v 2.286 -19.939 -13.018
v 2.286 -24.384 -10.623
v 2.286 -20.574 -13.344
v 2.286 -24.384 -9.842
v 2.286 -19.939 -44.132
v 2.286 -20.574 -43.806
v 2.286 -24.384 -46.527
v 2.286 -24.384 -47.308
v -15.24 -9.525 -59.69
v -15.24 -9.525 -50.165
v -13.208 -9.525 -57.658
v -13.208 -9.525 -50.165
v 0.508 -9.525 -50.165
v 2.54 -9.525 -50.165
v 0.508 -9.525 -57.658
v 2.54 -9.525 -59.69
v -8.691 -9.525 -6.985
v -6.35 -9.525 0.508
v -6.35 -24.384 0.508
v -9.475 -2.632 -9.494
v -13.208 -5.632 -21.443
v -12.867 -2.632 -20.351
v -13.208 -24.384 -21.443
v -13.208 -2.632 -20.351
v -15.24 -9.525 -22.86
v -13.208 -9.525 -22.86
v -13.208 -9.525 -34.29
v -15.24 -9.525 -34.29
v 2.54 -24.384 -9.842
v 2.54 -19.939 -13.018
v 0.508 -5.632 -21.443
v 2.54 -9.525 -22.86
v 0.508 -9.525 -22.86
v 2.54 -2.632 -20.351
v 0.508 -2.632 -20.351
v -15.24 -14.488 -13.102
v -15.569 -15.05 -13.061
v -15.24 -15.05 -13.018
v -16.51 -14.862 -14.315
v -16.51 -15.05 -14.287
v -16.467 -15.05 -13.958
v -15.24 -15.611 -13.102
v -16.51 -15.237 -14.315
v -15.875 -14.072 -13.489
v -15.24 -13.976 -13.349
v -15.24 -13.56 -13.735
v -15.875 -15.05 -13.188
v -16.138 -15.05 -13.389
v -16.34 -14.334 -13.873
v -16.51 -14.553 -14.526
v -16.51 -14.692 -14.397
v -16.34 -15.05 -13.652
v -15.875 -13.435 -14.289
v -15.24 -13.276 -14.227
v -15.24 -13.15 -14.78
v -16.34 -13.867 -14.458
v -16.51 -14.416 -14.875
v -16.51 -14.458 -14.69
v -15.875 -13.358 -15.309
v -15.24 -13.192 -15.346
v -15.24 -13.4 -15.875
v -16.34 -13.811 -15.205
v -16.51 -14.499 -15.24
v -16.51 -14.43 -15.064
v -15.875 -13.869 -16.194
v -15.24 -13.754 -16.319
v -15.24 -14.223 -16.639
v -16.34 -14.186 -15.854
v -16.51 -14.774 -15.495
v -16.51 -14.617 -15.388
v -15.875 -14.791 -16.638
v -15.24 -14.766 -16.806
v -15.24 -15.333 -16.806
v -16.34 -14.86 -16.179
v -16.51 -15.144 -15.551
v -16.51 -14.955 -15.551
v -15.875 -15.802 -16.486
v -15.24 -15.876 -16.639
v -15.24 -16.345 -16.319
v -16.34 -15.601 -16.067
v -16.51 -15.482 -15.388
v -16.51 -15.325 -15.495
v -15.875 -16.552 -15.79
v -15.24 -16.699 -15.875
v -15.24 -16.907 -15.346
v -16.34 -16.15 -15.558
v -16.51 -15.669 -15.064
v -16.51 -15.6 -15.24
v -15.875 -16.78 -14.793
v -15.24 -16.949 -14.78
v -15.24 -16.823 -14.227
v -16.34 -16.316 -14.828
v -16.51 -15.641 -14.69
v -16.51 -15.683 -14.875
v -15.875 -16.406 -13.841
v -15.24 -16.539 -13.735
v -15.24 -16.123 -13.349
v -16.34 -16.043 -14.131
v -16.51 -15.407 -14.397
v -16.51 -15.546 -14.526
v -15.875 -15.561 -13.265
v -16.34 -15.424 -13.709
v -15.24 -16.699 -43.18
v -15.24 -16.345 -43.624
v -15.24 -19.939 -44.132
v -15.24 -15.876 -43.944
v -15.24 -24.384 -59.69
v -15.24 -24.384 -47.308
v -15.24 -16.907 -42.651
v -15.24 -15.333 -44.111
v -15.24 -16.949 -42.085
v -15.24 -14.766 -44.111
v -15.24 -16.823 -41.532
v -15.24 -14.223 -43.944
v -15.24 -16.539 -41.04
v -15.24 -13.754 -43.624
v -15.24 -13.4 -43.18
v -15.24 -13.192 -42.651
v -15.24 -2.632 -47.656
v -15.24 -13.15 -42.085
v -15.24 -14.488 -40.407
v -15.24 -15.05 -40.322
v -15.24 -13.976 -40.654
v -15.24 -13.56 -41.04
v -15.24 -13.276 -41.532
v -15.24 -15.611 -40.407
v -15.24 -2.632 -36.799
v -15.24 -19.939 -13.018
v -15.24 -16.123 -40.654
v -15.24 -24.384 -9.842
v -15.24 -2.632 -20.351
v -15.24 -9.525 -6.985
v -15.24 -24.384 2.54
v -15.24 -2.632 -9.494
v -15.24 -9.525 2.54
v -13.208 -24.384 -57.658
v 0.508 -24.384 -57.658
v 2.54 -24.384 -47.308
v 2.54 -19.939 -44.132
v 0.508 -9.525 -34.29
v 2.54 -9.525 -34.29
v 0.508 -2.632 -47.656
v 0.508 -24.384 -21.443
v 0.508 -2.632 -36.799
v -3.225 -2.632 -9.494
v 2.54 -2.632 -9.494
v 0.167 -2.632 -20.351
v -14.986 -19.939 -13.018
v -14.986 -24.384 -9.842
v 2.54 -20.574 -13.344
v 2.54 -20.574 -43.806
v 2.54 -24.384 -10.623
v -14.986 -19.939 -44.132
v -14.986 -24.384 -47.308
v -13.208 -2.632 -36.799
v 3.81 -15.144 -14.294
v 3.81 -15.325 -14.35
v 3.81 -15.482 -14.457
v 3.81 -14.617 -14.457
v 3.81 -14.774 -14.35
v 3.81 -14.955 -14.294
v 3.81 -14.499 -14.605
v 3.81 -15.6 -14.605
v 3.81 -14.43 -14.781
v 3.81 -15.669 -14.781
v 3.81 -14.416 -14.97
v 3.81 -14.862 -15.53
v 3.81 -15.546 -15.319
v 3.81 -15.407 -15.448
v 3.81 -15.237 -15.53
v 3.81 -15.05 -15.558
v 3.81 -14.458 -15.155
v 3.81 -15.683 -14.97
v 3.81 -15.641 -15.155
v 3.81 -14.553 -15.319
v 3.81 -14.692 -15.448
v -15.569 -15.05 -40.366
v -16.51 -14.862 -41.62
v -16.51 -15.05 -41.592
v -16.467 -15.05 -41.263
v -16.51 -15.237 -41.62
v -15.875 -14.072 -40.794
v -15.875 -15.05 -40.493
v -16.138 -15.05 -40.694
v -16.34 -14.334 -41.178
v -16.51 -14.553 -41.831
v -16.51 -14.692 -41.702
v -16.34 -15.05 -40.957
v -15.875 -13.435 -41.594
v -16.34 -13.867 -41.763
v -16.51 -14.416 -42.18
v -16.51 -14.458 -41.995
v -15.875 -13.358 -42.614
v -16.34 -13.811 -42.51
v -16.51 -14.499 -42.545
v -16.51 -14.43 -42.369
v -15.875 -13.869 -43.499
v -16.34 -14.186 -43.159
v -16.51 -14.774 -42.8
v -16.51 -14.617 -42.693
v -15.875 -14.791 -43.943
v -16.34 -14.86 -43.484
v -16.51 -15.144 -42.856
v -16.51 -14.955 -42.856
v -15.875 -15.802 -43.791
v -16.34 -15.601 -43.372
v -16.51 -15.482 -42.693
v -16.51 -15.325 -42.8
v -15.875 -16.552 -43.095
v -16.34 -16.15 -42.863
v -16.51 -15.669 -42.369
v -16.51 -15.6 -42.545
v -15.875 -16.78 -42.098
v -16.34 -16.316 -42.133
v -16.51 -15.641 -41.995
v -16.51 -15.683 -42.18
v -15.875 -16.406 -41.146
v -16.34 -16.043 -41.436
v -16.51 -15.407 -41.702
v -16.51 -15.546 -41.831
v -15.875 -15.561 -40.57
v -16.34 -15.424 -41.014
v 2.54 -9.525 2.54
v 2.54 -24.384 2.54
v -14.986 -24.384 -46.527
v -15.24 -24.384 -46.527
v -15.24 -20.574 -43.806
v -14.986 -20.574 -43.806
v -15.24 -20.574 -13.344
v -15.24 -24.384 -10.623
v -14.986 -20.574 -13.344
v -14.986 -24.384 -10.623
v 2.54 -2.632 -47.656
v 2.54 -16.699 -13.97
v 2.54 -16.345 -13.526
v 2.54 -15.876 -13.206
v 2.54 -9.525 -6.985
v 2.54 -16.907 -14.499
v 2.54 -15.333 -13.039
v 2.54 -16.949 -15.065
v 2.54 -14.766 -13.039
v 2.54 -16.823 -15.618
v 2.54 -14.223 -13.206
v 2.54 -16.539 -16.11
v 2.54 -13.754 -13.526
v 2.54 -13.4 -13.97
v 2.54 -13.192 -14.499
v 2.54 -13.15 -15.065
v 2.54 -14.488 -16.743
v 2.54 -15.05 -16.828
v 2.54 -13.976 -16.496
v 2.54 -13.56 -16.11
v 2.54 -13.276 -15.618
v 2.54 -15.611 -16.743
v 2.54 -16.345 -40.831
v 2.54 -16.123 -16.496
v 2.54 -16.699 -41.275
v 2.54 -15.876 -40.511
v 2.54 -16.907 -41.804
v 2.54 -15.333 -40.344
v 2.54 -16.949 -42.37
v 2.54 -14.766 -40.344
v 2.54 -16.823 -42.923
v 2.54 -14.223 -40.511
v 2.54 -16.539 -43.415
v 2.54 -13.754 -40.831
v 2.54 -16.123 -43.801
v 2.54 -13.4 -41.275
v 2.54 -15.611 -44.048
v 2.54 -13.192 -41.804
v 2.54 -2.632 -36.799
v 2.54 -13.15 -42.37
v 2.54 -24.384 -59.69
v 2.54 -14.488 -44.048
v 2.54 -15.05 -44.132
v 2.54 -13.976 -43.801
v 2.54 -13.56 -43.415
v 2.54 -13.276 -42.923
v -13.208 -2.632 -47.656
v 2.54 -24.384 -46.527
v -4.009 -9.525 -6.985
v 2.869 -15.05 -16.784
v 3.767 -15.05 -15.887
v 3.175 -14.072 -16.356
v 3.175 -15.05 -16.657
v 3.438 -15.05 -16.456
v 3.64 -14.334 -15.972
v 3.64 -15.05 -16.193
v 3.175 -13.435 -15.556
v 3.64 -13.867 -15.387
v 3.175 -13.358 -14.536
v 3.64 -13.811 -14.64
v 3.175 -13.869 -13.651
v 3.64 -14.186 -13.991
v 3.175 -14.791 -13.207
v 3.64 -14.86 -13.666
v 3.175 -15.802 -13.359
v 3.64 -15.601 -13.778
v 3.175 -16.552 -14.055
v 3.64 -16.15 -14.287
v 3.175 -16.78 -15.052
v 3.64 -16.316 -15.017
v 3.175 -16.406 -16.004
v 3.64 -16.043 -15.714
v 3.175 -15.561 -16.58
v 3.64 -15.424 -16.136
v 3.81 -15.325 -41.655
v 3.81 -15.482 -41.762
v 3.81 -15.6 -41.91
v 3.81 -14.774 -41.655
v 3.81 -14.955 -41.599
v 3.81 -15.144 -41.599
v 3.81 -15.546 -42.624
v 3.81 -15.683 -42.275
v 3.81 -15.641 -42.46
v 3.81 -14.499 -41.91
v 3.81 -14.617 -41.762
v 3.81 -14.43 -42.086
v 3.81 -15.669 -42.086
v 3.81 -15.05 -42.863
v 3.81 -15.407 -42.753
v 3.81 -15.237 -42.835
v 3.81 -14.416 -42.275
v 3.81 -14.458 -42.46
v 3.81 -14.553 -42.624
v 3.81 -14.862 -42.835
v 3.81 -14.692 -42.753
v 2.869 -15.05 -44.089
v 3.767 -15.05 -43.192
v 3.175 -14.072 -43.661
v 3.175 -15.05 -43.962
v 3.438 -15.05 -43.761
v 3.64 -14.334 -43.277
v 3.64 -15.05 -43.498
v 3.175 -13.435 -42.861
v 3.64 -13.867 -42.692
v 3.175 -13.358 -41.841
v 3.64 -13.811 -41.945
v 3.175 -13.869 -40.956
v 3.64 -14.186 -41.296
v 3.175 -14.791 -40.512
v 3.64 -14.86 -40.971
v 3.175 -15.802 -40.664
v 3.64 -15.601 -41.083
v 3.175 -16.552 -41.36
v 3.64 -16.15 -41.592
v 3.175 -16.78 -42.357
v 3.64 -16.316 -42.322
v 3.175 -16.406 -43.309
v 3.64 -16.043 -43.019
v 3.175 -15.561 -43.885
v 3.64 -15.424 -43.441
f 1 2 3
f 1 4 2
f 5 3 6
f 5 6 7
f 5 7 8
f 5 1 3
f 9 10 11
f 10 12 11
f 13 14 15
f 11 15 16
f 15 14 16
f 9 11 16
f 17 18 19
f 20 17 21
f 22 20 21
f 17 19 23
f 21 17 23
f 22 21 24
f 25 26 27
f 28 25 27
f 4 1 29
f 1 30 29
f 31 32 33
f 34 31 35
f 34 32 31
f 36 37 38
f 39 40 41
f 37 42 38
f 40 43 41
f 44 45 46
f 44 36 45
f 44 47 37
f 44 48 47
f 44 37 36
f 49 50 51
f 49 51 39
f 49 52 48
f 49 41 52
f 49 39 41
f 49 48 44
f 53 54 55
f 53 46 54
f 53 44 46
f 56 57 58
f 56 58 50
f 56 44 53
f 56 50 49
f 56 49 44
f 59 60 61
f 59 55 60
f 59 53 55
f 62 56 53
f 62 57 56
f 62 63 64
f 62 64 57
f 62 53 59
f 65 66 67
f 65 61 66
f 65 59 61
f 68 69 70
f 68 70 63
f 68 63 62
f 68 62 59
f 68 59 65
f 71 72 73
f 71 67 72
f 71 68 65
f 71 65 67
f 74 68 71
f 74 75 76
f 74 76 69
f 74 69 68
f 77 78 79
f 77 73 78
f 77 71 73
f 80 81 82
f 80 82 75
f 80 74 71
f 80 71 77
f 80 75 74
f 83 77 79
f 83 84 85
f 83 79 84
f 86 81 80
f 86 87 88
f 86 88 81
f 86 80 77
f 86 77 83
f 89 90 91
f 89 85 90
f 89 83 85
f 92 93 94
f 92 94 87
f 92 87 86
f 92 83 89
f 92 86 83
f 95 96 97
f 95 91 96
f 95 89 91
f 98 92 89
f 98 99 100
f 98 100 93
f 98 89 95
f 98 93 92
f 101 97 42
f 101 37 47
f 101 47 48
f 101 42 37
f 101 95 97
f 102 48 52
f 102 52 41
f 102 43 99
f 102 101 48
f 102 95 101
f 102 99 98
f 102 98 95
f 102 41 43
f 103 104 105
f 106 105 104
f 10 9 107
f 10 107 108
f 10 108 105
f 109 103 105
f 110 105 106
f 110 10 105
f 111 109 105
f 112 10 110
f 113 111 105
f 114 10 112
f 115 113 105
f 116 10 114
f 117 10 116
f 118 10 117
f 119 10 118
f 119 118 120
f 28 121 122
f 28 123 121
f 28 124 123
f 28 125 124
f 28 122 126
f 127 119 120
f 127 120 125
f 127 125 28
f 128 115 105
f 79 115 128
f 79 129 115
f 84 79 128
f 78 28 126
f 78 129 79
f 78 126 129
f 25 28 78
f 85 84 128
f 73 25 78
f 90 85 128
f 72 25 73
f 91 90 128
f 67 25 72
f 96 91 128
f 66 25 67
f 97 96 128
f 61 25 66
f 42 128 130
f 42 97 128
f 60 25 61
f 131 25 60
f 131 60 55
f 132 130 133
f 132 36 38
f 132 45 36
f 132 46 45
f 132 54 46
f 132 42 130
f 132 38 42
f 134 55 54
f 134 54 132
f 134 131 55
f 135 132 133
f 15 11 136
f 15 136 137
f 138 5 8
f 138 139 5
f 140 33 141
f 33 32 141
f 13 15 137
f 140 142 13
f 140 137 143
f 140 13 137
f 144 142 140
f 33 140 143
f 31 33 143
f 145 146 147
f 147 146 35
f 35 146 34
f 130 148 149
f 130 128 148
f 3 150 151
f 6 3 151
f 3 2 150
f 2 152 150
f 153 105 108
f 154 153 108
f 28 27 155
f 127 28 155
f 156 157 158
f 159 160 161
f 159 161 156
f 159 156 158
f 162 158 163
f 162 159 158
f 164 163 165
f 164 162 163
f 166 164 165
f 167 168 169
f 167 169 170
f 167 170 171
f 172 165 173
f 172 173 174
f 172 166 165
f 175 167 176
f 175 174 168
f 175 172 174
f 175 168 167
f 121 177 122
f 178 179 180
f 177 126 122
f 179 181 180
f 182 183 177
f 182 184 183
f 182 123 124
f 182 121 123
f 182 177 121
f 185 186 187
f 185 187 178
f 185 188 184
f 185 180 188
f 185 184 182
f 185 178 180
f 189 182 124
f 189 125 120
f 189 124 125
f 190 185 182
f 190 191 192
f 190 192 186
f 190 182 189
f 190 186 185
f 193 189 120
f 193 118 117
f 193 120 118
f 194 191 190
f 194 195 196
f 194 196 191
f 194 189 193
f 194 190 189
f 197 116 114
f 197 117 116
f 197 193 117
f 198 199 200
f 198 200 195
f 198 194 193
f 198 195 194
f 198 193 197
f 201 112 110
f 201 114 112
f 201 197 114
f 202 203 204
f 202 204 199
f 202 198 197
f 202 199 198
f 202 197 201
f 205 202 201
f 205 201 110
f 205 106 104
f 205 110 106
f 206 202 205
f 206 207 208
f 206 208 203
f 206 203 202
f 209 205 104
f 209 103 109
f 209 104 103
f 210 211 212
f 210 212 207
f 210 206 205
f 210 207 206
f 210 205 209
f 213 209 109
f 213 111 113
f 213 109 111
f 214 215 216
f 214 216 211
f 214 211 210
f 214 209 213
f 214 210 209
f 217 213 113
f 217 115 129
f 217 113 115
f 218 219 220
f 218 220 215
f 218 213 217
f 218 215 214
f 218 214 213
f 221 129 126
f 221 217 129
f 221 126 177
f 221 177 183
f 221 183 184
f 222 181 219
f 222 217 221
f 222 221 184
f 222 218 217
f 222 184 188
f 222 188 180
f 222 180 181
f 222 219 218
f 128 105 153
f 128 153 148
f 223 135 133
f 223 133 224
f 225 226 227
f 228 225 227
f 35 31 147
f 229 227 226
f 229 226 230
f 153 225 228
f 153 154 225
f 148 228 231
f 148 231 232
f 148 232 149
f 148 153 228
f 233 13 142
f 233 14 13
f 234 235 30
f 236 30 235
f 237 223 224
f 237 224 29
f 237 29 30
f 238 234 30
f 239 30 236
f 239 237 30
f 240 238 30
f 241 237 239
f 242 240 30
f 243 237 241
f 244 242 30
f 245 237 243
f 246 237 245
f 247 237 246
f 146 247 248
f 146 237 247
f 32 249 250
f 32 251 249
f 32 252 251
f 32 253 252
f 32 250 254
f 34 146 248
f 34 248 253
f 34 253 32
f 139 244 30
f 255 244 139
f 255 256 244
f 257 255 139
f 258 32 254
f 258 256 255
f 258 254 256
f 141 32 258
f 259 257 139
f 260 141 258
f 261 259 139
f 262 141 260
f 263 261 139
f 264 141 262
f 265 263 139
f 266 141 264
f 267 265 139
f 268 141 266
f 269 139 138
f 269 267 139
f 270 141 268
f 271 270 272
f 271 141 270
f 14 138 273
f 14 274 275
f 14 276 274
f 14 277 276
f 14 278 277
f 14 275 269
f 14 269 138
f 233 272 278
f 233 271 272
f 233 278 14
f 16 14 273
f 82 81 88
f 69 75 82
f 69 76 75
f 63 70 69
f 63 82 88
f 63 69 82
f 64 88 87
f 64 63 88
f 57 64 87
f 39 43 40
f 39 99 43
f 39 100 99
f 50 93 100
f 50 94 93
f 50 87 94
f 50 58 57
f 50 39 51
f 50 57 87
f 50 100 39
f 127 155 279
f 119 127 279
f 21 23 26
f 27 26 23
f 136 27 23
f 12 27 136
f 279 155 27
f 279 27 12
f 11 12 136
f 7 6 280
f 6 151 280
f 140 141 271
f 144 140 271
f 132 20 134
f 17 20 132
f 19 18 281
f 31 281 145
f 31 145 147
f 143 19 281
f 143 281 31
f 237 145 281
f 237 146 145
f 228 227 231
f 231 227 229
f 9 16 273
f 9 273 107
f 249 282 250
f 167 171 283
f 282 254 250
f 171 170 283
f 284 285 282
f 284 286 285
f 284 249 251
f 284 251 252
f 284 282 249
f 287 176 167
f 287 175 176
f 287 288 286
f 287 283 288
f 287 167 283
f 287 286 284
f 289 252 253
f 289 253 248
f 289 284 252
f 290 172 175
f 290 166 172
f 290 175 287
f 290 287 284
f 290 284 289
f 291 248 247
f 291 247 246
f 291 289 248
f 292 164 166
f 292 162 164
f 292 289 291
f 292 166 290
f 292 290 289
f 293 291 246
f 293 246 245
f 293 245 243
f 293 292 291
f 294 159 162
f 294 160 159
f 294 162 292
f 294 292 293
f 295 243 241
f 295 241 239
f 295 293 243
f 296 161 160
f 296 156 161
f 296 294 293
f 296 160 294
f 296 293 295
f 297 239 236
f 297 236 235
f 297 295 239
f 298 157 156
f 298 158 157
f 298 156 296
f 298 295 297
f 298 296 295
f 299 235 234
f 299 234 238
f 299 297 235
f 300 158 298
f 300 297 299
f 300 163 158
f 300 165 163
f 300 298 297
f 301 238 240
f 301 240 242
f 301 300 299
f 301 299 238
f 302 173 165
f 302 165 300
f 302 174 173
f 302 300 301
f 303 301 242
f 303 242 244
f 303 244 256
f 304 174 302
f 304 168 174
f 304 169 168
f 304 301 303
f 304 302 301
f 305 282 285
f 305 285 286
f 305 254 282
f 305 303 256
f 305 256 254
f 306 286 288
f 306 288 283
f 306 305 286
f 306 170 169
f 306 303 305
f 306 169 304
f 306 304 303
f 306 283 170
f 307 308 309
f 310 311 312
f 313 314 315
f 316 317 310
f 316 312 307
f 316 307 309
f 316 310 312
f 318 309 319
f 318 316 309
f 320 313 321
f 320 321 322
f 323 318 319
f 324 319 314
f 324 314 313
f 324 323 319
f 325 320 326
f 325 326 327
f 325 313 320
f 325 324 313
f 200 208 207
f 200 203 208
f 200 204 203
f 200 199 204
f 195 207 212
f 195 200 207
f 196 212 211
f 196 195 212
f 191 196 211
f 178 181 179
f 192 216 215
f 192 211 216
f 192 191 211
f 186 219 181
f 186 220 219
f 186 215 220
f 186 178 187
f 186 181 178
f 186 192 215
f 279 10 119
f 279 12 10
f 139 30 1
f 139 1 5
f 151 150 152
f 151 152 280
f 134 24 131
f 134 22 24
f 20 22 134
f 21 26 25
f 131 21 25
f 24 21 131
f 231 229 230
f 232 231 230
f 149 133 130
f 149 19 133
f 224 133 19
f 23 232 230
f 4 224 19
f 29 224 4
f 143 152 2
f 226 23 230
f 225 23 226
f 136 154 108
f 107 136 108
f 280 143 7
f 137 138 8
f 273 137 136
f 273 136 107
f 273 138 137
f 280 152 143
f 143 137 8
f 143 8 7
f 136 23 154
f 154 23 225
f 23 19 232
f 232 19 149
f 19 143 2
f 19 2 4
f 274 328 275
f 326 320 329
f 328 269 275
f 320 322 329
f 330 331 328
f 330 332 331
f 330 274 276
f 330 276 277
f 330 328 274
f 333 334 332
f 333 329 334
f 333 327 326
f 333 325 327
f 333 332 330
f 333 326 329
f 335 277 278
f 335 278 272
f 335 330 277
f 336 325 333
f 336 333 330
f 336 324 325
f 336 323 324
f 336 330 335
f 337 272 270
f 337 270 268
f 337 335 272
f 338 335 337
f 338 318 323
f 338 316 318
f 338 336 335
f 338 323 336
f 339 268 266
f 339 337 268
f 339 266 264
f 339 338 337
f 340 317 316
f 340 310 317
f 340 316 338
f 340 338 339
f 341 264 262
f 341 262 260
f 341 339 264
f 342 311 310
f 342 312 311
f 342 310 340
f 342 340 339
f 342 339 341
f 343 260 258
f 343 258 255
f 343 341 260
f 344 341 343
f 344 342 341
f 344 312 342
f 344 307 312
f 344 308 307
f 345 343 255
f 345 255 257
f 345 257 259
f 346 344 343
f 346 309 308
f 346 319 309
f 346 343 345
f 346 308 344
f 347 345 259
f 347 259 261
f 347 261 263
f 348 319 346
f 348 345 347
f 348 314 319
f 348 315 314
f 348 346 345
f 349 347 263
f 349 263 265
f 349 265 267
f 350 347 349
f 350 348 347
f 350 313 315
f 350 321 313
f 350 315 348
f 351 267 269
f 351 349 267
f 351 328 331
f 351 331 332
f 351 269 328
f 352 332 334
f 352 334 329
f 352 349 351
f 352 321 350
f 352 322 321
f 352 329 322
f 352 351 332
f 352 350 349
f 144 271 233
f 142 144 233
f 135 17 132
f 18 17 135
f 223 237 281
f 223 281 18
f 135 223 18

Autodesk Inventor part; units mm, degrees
ref_plane "YZ Plane" through (0, 0, 0) normal (1, 0, 0) x (0, 1, 0)
ref_plane "XZ Plane" through (0, 0, 0) normal (0, 1, 0) x (-1, 0, 0)
ref_plane "XY Plane" through (0, 0, 0) normal (0, 0, 1) x (1, 0, 0)
sketch "Sketch1" plane through (0, 0, 0) normal (0, 1, 0) x (-1, 0, 0)
  line L0 (0, 0) -> (12.7, 0)
  line L1 (12.7, 0) -> (12.7, -57.15)
  line L2 (12.7, -57.15) -> (0, -57.15)
  line L3 (0, -57.15) -> (0, 0)
  line L4 (15.24, -59.69) -> (15.24, 2.54)
  line L5 (15.24, 2.54) -> (-2.54, 2.54)
  line L6 (-2.54, 2.54) -> (-2.54, -59.69)
  line L7 (-2.54, -59.69) -> (15.24, -59.69)
  dimension "d0" = 12.7
  dimension "d1" = 57.15
  dimension "d2" = 2.54
extrude "Extrusion1" add sketch "Sketch1" against normal blind 31.75
sketch "Sketch2" plane through (2.54, 0, 2.54) normal (1, 0, 0) x (0, 0, -1)
  point P0 (2.54, 0)
sketch "Sketch3" plane through (2.54, 0, 2.54) normal (1, 0, 0) x (0, 0, -1)
  line L0 (59.69, 0) -> (2.54, 0) projected
  line L1 (-1.2014, -9.525) -> (66.2927, -9.525)
  line L2 (31.115, 0) -> (31.115, -9.525)
  line L3 (0, 0) -> (0, -31.75) projected
  line L4 (0, -9.525) -> (8.255, -9.525)
  line L5 (62.23, 0) -> (62.23, -31.75) projected
  line L6 (62.23, -9.525) -> (53.975, -9.525)
  line L7 (31.115, -9.525) -> (34.925, -9.525)
  line L8 (31.115, -9.525) -> (27.305, -9.525)
  line L9 (0, -9.525) -> (9.525, -9.525)
  line L10 (31.115, -9.525) -> (25.4, -9.525)
  line L11 (31.115, -9.525) -> (36.83, -9.525)
  line L12 (62.23, -9.525) -> (52.705, -9.525)
  line L13 (0, 5.2281) -> (17.78, 5.2281)
  line L14 (17.78, 5.2281) -> (17.78, -9.525)
  line L15 (17.78, 0) -> (17.78, -2.54)
  line L16 (0, -2.54) -> (62.23, -2.54)
  line L17 (36.83, -9.525) -> (44.4179, 11.3227)
  line L18 (52.705, -9.525) -> (48.1245, 3.0598)
  line L19 (9.525, -9.525) -> (14.5428, 4.2614)
  line L20 (25.4, -9.525) -> (21.085, 2.3303)
  line L21 (36.83, -9.525) -> (52.705, -9.525)
  line L22 (-3.8276, -2.6318) -> (67.8028, -2.6318)
  line L23 (67.8028, -2.6318) -> (67.8028, 7.3948)
  line L24 (67.8028, 7.3948) -> (-3.8276, 7.3948)
  line L25 (-3.8276, 7.3948) -> (-3.8276, -2.6318)
  line L26 (-1.2014, -9.525) -> (-3.8276, -2.6318)
  line L27 (65.275, -9.525) -> (67.8028, -2.6318)
  point P0 (12.0339, -2.6318)
  point P1 (22.8911, -2.6318)
  point P2 (39.3389, -2.6318)
  point P3 (50.1961, -2.6318)
  dimension "d10" = 9.525
  dimension "d11" = 5.715
  dimension "d12" = 5.715
  dimension "d13" = 9.525
  dimension "d14" = 17.78
  dimension "d15" = 2.54
  dimension "d16" = 70
  dimension "d17" = 70
  dimension "d18" = 70
  dimension "d19" = 70
extrude "Extrusion2" cut sketch "Sketch3" against normal through all contours L18 L16 L17 L0 | L0 L17 L24 L23 L22 L5 L16 L18 | L17 L16 L2 L0 | L0 L19 L16 L3 L22 L25 L24 L17 | L18 L22 L17 L16 | L16 L5 L22 L18 | L2 L16 L20 L0 | L17 L22 L2 L16 | L22 L5 L1 L18 | L20 L16 L14 L0 | L2 L22 L20 L16 | L17 L1 L2 L22 | L22 L27 L1 L5 | L14 L16 L19 L0 | L20 L22 L14 L16 | L2 L1 L20 L22 | L22 L3 L1 L26 | L14 L22 L19 L16 | L22 L19 L1 L3 | L3 L16 L19 L22
sketch "Sketch4" plane through (2.54, -31.75, 2.54) normal (1, 0, 0) x (0, 0, -1)
  line L0 (0, 22.225) -> (0, 0) projected
  line L1 (0, 22.225) -> (0, 0)
  line L2 (0, 0) -> (0, 7.366)
  line L3 (0, 7.366) -> (62.23, 7.366)
  line L4 (62.23, 22.225) -> (62.23, 0) projected
  line L5 (12.0339, 29.1182) -> (22.8911, 29.1182) projected
  line L6 (17.4625, 29.1182) -> (17.4625, 4.5442)
  line L7 (50.1961, 29.1182) -> (39.3389, 29.1182) projected
  line L8 (44.7675, 29.1182) -> (44.7675, 5.1393)
  line L9 (17.4625, 7.366) -> (14.2875, 7.366)
  line L10 (44.7675, 7.366) -> (47.9425, 7.366)
  line L11 (47.9425, 7.366) -> (47.9425, 11.811)
  line L12 (14.2875, 7.366) -> (14.2875, 11.811)
  line L13 (17.4625, 11.811) -> (44.7675, 11.811)
  line L14 (0, 7.366) -> (0, 22.225)
  line L15 (0, 14.7955) -> (64.3687, 14.7955)
  line L16 (0, 16.7005) -> (64.3687, 16.7005)
  circle A0 centre (17.4625, 16.7005) radius 1.905
  circle A1 centre (44.7675, 16.7005) radius 1.905
  line L17 (46.6725, 11.811) -> (49.8475, 7.366)
  line L18 (15.5575, 11.811) -> (12.3825, 7.366)
  line L19 (15.5575, 11.811) -> (17.4625, 11.811)
  line L20 (46.6725, 11.811) -> (44.7675, 11.811)
  line L21 (12.8992, 6.9969) -> (15.8843, 11.176)
  line L22 (15.8843, 11.176) -> (17.4625, 11.176)
  line L23 (17.4625, 11.176) -> (44.7675, 11.176)
  line L24 (44.7675, 11.176) -> (46.3457, 11.176)
  line L25 (46.3457, 11.176) -> (49.3308, 6.9969)
  line L26 (0, 6.731) -> (62.23, 6.731)
  line L27 (12.8992, 6.9969) -> (12.7093, 6.731)
  line L28 (49.3308, 6.9969) -> (49.8475, 6.3495)
  point P0 (2.54, 31.75)
  point P1 (49.543, 6.731)
  point P2 (62.23, 6.731)
  point P3 (0, 7.366)
  point P4 (0, 6.731)
  dimension "d22" = 7.366
  dimension "d23" = 3.175
  dimension "d24" = 3.175
  dimension "d25" = 4.445
  dimension "d26" = 4.445
  dimension "d27" = 1.905
  dimension "d28" = 0.635
  dimension "d29" = 0.635
sketch "Sketch5" plane through (-15.24, -31.75, -59.69) normal (-1, 0, 0) x (0, 0, 1)
  line L0 (0, 22.225) -> (0, 0)
  line L1 (0, 22.225) -> (0, 0)
  line L2 (0, 0) -> (0, 7.366)
  line L3 (0, 7.366) -> (62.23, 7.366)
  line L4 (62.23, 22.225) -> (62.23, 0)
  line L5 (12.0339, 29.1182) -> (22.8911, 29.1182)
  line L6 (17.4625, 29.1182) -> (17.4625, 4.5442)
  line L7 (50.1961, 29.1182) -> (39.3389, 29.1182)
  line L8 (44.7675, 29.1182) -> (44.7675, 5.1393)
  line L9 (17.4625, 7.366) -> (14.2875, 7.366)
  line L10 (44.7675, 7.366) -> (47.9425, 7.366)
  line L11 (47.9425, 7.366) -> (47.9425, 11.811)
  line L12 (14.2875, 7.366) -> (14.2875, 11.811)
  line L13 (17.4625, 11.811) -> (44.7675, 11.811)
  line L14 (0, 7.366) -> (0, 22.225)
  line L15 (0, 14.7955) -> (64.3687, 14.7955)
  line L16 (0, 16.7005) -> (64.3687, 16.7005)
  circle A0 centre (17.4625, 16.7005) radius 1.905
  circle A1 centre (44.7675, 16.7005) radius 1.905
  line L17 (46.6725, 11.811) -> (49.8475, 7.366)
  line L18 (15.5575, 11.811) -> (12.3825, 7.366)
  line L19 (15.5575, 11.811) -> (17.4625, 11.811)
  line L20 (46.6725, 11.811) -> (44.7675, 11.811)
  line L21 (12.8992, 6.9969) -> (15.8843, 11.176)
  line L22 (15.8843, 11.176) -> (17.4625, 11.176)
  line L23 (17.4625, 11.176) -> (44.7675, 11.176)
  line L24 (44.7675, 11.176) -> (46.3457, 11.176)
  line L25 (46.3457, 11.176) -> (49.3308, 6.9969)
  line L26 (0, 6.731) -> (62.23, 6.731)
  line L27 (12.8992, 6.9969) -> (12.7093, 6.731)
  line L28 (49.3308, 6.9969) -> (49.8475, 6.3495)
  point P0 (59.69, 31.75)
  point P1 (2.54, 31.75)
  point P2 (0, 6.731)
  point P3 (49.543, 6.731)
  point P4 (62.23, 6.731)
  point P5 (0, 7.366)
  dimension "d30" = 7.366
  dimension "d31" = 3.175
  dimension "d32" = 3.175
  dimension "d33" = 4.445
  dimension "d34" = 4.445
  dimension "d35" = 1.905
  dimension "d36" = 0.635
  dimension "d37" = 0.635
extrude "Extrusion3" cut sketch "Sketch5" against normal blind 0.254 contours L3 L21 L27 L26 L0 | L18 L12 L21 L3 | L13 L8 L23 L6 | L6 L22 L21 L12 L18 L19 | L20 L17 L11 L25 L24 L8 | L4 L26 L28 L25 L3 | L17 L3 L25 L11
sketch "Sketch6" plane through (-15.24, -9.525, -34.29) normal (-1, 0, 0) x (0, 0, 1)
  line L0 (-25.4, 0) -> (-25.4, -22.225)
  line L1 (-25.4, 0) -> (-25.4, -22.225)
  line L2 (-25.4, -22.225) -> (-25.4, -14.859)
  line L3 (-25.4, -14.859) -> (36.83, -14.859)
  line L4 (36.83, 0) -> (36.83, -22.225)
  line L5 (-13.3661, 6.8933) -> (-2.5089, 6.8933)
  line L6 (-7.9375, 6.8933) -> (-7.9375, -17.6808)
  line L7 (24.7961, 6.8933) -> (13.9389, 6.8933)
  line L8 (19.3675, 6.8933) -> (19.3675, -17.0857)
  line L9 (-7.9375, -14.859) -> (-11.1125, -14.859)
  line L10 (19.3675, -14.859) -> (22.5425, -14.859)
  line L11 (22.5425, -14.859) -> (22.5425, -10.414)
  line L12 (-11.1125, -14.859) -> (-11.1125, -10.414)
  line L13 (-7.9375, -10.414) -> (19.3675, -10.414)
  line L14 (-25.4, -14.859) -> (-25.4, 0)
  line L15 (-25.4, -7.4295) -> (38.9686, -7.4295)
  line L16 (-25.4, -5.5245) -> (38.9686, -5.5245)
  circle A0 centre (-7.9375, -5.5245) radius 1.905
  circle A1 centre (19.3675, -5.5245) radius 1.905
  line L17 (21.2725, -10.414) -> (24.4475, -14.859)
  line L18 (-9.8425, -10.414) -> (-13.0175, -14.859)
  line L19 (-9.8425, -10.414) -> (-7.9375, -10.414)
  line L20 (21.2725, -10.414) -> (19.3675, -10.414)
  line L21 (-12.5008, -15.228) -> (-9.5157, -11.049)
  line L22 (-9.5157, -11.049) -> (-7.9375, -11.049)
  line L23 (-7.9375, -11.049) -> (19.3675, -11.049)
  line L24 (19.3675, -11.049) -> (20.9457, -11.049)
  line L25 (20.9457, -11.049) -> (23.9308, -15.228)
  line L26 (-25.4, -15.494) -> (36.83, -15.494)
  line L27 (-12.5008, -15.228) -> (-12.6907, -15.494)
  line L28 (23.9308, -15.228) -> (24.4475, -15.8755)
  point P0 (34.29, 9.525)
  point P1 (-22.86, 9.525)
  dimension "d40" = 7.366
  dimension "d41" = 3.175
  dimension "d42" = 3.175
  dimension "d43" = 4.445
  dimension "d44" = 4.445
  dimension "d45" = 1.905
  dimension "d46" = 0.635
  dimension "d47" = 0.635
extrude "Extrusion4" cut sketch "Sketch4" against normal blind 0.254 contours L3 L21 L27 L26 L0 | L18 L12 L21 L3 | L13 L8 L23 L6 | L6 L22 L21 L12 L18 L19 | L20 L17 L11 L25 L24 L8 | L4 L26 L28 L25 L3 | L17 L3 L25 L11
sketch "Sketch7" plane through (2.54, -9.525, -22.86) normal (1, 0, 0) x (0, 0, -1)
  point P0 (-22.86, 9.525)
extrude "Extrusion5" add sketch "Sketch6" along normal blind 1.27 contours A0 L6 L16 | L16 L6 A0 | L6 L16 A0 | L6 A0 L16 | A1 L16 L8 | L8 L16 A1 | L16 A1 L8 | L8 A1 L16
sketch "Sketch8" plane through (2.54, -9.525, -22.86) normal (1, 0, 0) x (0, 0, -1)
  circle A0 centre (-7.9375, -5.5245) radius 1.905 projected
  circle A1 centre (-7.9375, -5.5245) radius 1.905
  circle A2 centre (19.3675, -5.5245) radius 1.905 projected
  circle A3 centre (19.3675, -5.5245) radius 1.905
  point P0 (-22.86, 9.525)
extrude "Extrusion6" add sketch "Sketch8" along normal blind 1.27
sketch "Sketch9" plane through (-15.24, -9.525, -34.29) normal (-1, 0, 0) x (0, 0, 1)
  line L0 (-25.4, 0) -> (-25.4, -14.859) projected
  line L1 (-25.4, -15.494) -> (-12.713, -15.494) projected
  line L2 (-25.4, -14.859) -> (-25.146, -14.859)
  line L3 (-25.146, -14.859) -> (-25.146, -15.494)
  line L4 (-25.146, -15.494) -> (-25.4, -15.494)
  line L5 (-25.4, -15.494) -> (-25.4, -14.859)
  line L6 (24.4475, -14.859) -> (36.83, -14.859) projected
  line L7 (36.83, -15.494) -> (36.576, -15.494)
  line L8 (36.576, -15.494) -> (36.576, -14.859)
  line L9 (36.576, -14.859) -> (36.83, -14.859)
  line L10 (36.83, -14.859) -> (36.83, -15.494)
  point P0 (34.29, 9.525)
  dimension "d54" = 0.254
  dimension "d55" = 0.254
extrude "Extrusion7" cut sketch "Sketch9" against normal blind 2540
fillet "Fillet1" radius 1.27 4 edges at (-16.51, -15.0495, -44.1325) (-16.51, -15.0495, -16.8275) (3.81, -15.0495, -13.0175) (3.81, -15.0495, -40.3225)
sketch "Sketch10" plane through (-12.7, -31.75, 0) normal (1, 0, 0) x (0, 0, -1)
  line L0 (0, 0) -> (57.15, 0) projected
  line L1 (59.69, 6.731) -> (59.69, 0) projected
  line L2 (0, 0) -> (59.69, 0)
  line L3 (59.69, 0) -> (59.69, 2.54)
  line L4 (59.69, 2.54) -> (0, 2.54)
  line L5 (0, 2.54) -> (0, 0)
  point P0 (0, 31.75)
  dimension "d59" = 2.54
extrude "Extrusion8" add sketch "Sketch10" along normal blind 13.97
sketch "Sketch11" plane through (0, -31.75, 0) normal (0, -1, 0) x (1, 0, 0)
  line L0 (-14.986, 2.286) -> (2.286, 2.286) projected
  line L1 (-15.24, -59.69) -> (2.54, -59.69) projected
  line L2 (2.54, -59.69) -> (2.54, 2.54) projected
  line L3 (2.54, 2.54) -> (-15.24, 2.54) projected
  line L4 (-15.24, 2.54) -> (-15.24, -59.69) projected
  line L5 (2.54, 2.54) -> (-15.24, 2.54) projected
  line L6 (-15.24, 2.54) -> (-15.24, -59.69) projected
  line L7 (2.54, 2.54) -> (-15.24, 2.54)
  line L8 (-6.35, 2.54) -> (-6.35, -73.2996)
  line L9 (-6.35, 2.54) -> (-4.445, 2.54)
  line L10 (-6.35, 2.54) -> (-8.255, 2.54)
  line L11 (-14.986, -59.436) -> (2.286, -59.436) projected
  line L12 (-8.255, 2.54) -> (-4.445, 2.54)
  line L13 (-4.445, 2.54) -> (-4.445, -59.436)
  line L14 (-4.445, -59.436) -> (-8.255, -59.436)
  line L15 (-8.255, -59.436) -> (-8.255, 2.54)
  point P0 (0, 0)
  point P1 (-8.255, 2.286)
  point P2 (-4.445, 2.286)
  dimension "d62" = 1.905
  dimension "d63" = 1.905
extrude "Extrusion9" add sketch "Sketch11" along normal blind 76.2 contours L0 L8 L11 L15 | L0 L13 L11 L8
sketch "Sketch12" plane through (-4.445, -31.75, 2.286) normal (1, 0, 0) x (0, 0, -1)
  line L0 (-988.062, -700.5234) -> (-988.062, 1325.7378) construction
  line L1 (-988.062, 1325.7378) -> (444.4144, 1325.7378) construction
  line L2 (444.4144, 1325.7378) -> (444.4144, -700.5234) construction
  line L3 (444.4144, -700.5234) -> (-988.062, -700.5234) construction
  line L4 (0, 0) -> (61.722, 0) projected
  line L5 (0, 0) -> (0, -76.2) projected
  line L6 (61.722, -76.2) -> (0, -76.2) projected
  line L7 (61.722, 0) -> (61.722, -76.2) projected
  line L8 (0, 0) -> (61.722, 0) projected
  line L9 (0, 0) -> (6.35, 0)
  line L10 (6.35, 0) -> (6.35, -11.43)
  line L11 (-0.254, 0) -> (61.976, 0) projected
  line L12 (61.722, 0) -> (55.372, 0)
  line L13 (55.372, 0) -> (55.372, -11.43)
  line L14 (0, 0) -> (0, -63.5)
  line L15 (0, 0) -> (0, -76.2) projected
  line L16 (39.4357, -63.5) -> (61.722, -63.5)
  line L17 (61.722, 0) -> (61.722, -76.2) projected
  line L18 (0, -63.5) -> (10.16, -63.5)
  line L19 (61.722, -63.5) -> (51.562, -63.5)
  line L20 (10.16, -63.5) -> (22.2863, -63.5)
  line L21 (50.9718, -63.5) -> (38.862, -63.5)
  line L22 (50.5789, -63.5) -> (54.7064, -63.5)
  line L23 (54.7064, -63.5) -> (46.4514, -63.5)
  line L24 (30.861, 0) -> (30.861, -25.4)
  line L25 (6.35, -11.43) -> (10.1169, -62.9113)
  line L26 (22.918, -62.9292) -> (26.6755, -25.9708)
  line L27 (27.3072, -25.4) -> (34.4148, -25.4)
  line L28 (35.0465, -25.9708) -> (38.804, -62.9292)
  line L29 (51.6051, -62.9113) -> (55.372, -11.43)
  line L30 (6.35, 0) -> (16.51, 0)
  line L31 (55.372, 0) -> (45.212, 0)
  arc A0 (6.35, -11.43) -> (16.51, 0) centre (5.0802, -0.0708) ccw
  arc A1 (45.212, 0) -> (55.372, -11.43) centre (56.6418, -0.0708) ccw
  arc A2 (27.3072, -25.4) -> (26.6755, -25.9708) centre (27.3072, -26.035) ccw
  arc A3 (35.0465, -25.9708) -> (34.4148, -25.4) centre (34.4148, -26.035) ccw
  arc A4 (22.2863, -63.5) -> (22.918, -62.9292) centre (22.2863, -62.865) ccw
  arc A5 (10.1169, -62.9113) -> (10.7502, -63.5) centre (10.7502, -62.865) ccw
  arc A6 (38.804, -62.9292) -> (39.4357, -63.5) centre (39.4357, -62.865) ccw
  arc A7 (50.9718, -63.5) -> (51.6051, -62.9113) centre (50.9718, -62.865) ccw
  line L32 (16.51, -63.5) -> (16.51, -52.07)
  line L33 (46.4514, -63.5) -> (46.4514, -52.07)
  line L34 (30.861, -25.4) -> (30.861, -19.05)
  line L35 (30.861, -19.05) -> (15.621, -19.05)
  line L36 (30.861, -19.05) -> (46.101, -19.05)
  circle A8 centre (15.621, -19.05) radius 3.175
  circle A9 centre (46.101, -19.05) radius 3.175
  circle A10 centre (16.51, -52.07) radius 3.175
  circle A11 centre (46.4514, -52.07) radius 3.175
  point P0 (2.286, 31.75)
  point P1 (22.86, -63.5)
  point P2 (10.7502, -63.5)
  dimension "d107" = 6.35
  dimension "d110" = 11.43
  dimension "d113" = 6.35
  dimension "d114" = 11.43
  dimension "d115" = 63.5
  dimension "d116" = 10.16
  dimension "d117" = 10.16
  dimension "d118" = 12.7
  dimension "d119" = 12.7
  dimension "d120" = 4.1275
  dimension "d121" = 8.255
  dimension "d122" = 25.4
  dimension "d123" = 10.16
  dimension "d125" = 10.16
  dimension "d126" = 11.43
  dimension "d127" = 11.43
  dimension "d128" = 0.635
  dimension "d130" = 11.43
  dimension "d131" = 11.43
  dimension "d132" = 6.35
  dimension "d133" = 15.24
  dimension "d134" = 15.24
  dimension "d135" = 6.35
  dimension "d136" = 6.35
  dimension "d137" = 6.35
  dimension "d138" = 6.35
extrude "Extrusion10" cut sketch "Sketch12" against normal blind 76.2 contours L4 L10 L25 A5 L20 L18 L5 | L4 A0 L10 | L18 L20 A4 L26 A2 L27 A3 L28 A6 L16 L7 L6 L5 | A10 | A8 | A9 | A11 | L4 L13 A1 | L16 A7 L29 L13 L4 L7
sketch "Sketch13" plane through (-15.24, -2.6318, -20.3511) normal (0, 1, 0) x (1, 0, 0)
  line L0 (15.24, -20.3511) -> (2.54, -20.3511) projected
  line L1 (2.54, 36.7989) -> (15.24, 36.7989) projected
  line L2 (2.54, -20.3511) -> (15.24, -20.3511)
  line L3 (15.24, -20.3511) -> (15.24, 36.7989)
  line L4 (15.24, 36.7989) -> (2.54, 36.7989)
  line L5 (2.54, 36.7989) -> (2.54, -20.3511)
  line L6 (15.748, 37.3069) -> (15.748, -20.8591)
  line L7 (15.748, -20.8591) -> (2.032, -20.8591)
  line L8 (2.032, -20.8591) -> (2.032, 37.3069)
  line L9 (2.032, 37.3069) -> (15.748, 37.3069)
  dimension "d141" = 0.508
extrude "Extrusion11" cut sketch "Sketch13" against normal blind 26.5684
sketch "Sketch15" plane through (2.54, -31.75, 2.54) normal (1, 0, 0) x (0, 0, -1)
  line L0 (0, 22.225) -> (0, 7.366) projected
  line L1 (0, 7.366) -> (66.5131, 7.366)
  line L2 (66.5131, 7.366) -> (66.5131, -92.4915)
  line L3 (66.5131, -92.4915) -> (0, -92.4915)
  line L4 (0, -92.4915) -> (0, 7.366)
  point P0 (2.54, 31.75)
extrude "Extrusion12" cut sketch "Sketch15" against normal blind 25.4
sketch "Sketch16" plane through (-15.24, -24.384, -46.5271) normal (0, -1, 0) x (1, 0, 0)
  line L0 (2.032, 47.0351) -> (2.032, -11.1309) projected
  line L1 (15.748, -11.1309) -> (15.748, -3.6379) projected
  line L2 (2.032, 47.0351) -> (15.748, 47.0351)
  line L3 (15.748, 47.0351) -> (15.748, -11.1309)
  line L4 (15.748, -11.1309) -> (2.032, -11.1309)
  line L5 (2.032, -11.1309) -> (2.032, 47.0351)
  line L6 (15.748, 47.0351) -> (2.032, 47.0351) projected
  line L7 (8.89, 47.0351) -> (8.89, 28.8487)
  line L8 (8.89, 47.0351) -> (19.7313, 12.3343)
  line L9 (8.89, 47.0351) -> (45.2449, 47.0351) construction
  line L10 (8.89, 47.0351) -> (-2.5411, 10.4465)
  point P0 (15.24, 46.5271)
  point P1 (2.032, 25.0841)
  point P2 (15.748, 25.0841)
  dimension "d146" = 58.166
  dimension "d147" = 13.716
  dimension "d148" = 18.1864
  dimension "d149" = 72.65
  dimension "d150" = 72.65
extrude "Extrusion13" add sketch "Sketch16" against normal blind 25.4 contours L2 L10 L0 | L2 L3 L8
sketch "Sketch17" plane through (2.54, -9.525, -22.86) normal (1, 0, 0) x (0, 0, -1)
  circle A0 centre (19.3675, -5.5245) radius 1.905 projected
  circle A1 centre (-7.9375, -5.5245) radius 1.905 projected
  line L0 (-25.4, -14.859) -> (-13.0175, -14.859) projected
  line L1 (-13.0175, -14.859) -> (-9.8425, -10.414) projected
  line L2 (-9.8425, -10.414) -> (21.2725, -10.414) projected
  line L3 (21.2725, -10.414) -> (24.4475, -14.859) projected
  line L4 (24.4475, -14.859) -> (36.83, -14.859) projected
  line L5 (36.83, 0) -> (36.83, -14.859) projected
  line L6 (36.83, 0) -> (27.305, 0) projected
  line L7 (27.305, 0) -> (24.7961, 6.8932) projected
  line L8 (24.7961, 6.8932) -> (13.9389, 6.8932) projected
  line L9 (13.9389, 6.8932) -> (11.43, 0) projected
  line L10 (11.43, 0) -> (0, 0) projected
  line L11 (0, 0) -> (-2.5089, 6.8932) projected
  line L12 (-2.5089, 6.8932) -> (-13.3661, 6.8932) projected
  line L13 (-13.3661, 6.8932) -> (-15.875, 0) projected
  line L14 (-15.875, 0) -> (-25.4, 0) projected
  line L15 (-25.4, 0) -> (-25.4, -14.859) projected
  line L16 (-25.4, 0) -> (-25.4, -14.859) projected
  line L17 (-25.4, 0) -> (-36.7467, 15.403)
  line L18 (-36.7467, 15.403) -> (3.7463, 26.3718)
  line L19 (3.7463, 26.3718) -> (3.7463, 4.1805)
  line L20 (3.7463, 4.1805) -> (0, 0)
  point P0 (-22.86, 9.525)
extrude "Extrusion14" cut sketch "Sketch17" against normal blind 25.4 contours L17 L18 L19 L20 L11 L12 L13 L14
properties part number "blade connector"
